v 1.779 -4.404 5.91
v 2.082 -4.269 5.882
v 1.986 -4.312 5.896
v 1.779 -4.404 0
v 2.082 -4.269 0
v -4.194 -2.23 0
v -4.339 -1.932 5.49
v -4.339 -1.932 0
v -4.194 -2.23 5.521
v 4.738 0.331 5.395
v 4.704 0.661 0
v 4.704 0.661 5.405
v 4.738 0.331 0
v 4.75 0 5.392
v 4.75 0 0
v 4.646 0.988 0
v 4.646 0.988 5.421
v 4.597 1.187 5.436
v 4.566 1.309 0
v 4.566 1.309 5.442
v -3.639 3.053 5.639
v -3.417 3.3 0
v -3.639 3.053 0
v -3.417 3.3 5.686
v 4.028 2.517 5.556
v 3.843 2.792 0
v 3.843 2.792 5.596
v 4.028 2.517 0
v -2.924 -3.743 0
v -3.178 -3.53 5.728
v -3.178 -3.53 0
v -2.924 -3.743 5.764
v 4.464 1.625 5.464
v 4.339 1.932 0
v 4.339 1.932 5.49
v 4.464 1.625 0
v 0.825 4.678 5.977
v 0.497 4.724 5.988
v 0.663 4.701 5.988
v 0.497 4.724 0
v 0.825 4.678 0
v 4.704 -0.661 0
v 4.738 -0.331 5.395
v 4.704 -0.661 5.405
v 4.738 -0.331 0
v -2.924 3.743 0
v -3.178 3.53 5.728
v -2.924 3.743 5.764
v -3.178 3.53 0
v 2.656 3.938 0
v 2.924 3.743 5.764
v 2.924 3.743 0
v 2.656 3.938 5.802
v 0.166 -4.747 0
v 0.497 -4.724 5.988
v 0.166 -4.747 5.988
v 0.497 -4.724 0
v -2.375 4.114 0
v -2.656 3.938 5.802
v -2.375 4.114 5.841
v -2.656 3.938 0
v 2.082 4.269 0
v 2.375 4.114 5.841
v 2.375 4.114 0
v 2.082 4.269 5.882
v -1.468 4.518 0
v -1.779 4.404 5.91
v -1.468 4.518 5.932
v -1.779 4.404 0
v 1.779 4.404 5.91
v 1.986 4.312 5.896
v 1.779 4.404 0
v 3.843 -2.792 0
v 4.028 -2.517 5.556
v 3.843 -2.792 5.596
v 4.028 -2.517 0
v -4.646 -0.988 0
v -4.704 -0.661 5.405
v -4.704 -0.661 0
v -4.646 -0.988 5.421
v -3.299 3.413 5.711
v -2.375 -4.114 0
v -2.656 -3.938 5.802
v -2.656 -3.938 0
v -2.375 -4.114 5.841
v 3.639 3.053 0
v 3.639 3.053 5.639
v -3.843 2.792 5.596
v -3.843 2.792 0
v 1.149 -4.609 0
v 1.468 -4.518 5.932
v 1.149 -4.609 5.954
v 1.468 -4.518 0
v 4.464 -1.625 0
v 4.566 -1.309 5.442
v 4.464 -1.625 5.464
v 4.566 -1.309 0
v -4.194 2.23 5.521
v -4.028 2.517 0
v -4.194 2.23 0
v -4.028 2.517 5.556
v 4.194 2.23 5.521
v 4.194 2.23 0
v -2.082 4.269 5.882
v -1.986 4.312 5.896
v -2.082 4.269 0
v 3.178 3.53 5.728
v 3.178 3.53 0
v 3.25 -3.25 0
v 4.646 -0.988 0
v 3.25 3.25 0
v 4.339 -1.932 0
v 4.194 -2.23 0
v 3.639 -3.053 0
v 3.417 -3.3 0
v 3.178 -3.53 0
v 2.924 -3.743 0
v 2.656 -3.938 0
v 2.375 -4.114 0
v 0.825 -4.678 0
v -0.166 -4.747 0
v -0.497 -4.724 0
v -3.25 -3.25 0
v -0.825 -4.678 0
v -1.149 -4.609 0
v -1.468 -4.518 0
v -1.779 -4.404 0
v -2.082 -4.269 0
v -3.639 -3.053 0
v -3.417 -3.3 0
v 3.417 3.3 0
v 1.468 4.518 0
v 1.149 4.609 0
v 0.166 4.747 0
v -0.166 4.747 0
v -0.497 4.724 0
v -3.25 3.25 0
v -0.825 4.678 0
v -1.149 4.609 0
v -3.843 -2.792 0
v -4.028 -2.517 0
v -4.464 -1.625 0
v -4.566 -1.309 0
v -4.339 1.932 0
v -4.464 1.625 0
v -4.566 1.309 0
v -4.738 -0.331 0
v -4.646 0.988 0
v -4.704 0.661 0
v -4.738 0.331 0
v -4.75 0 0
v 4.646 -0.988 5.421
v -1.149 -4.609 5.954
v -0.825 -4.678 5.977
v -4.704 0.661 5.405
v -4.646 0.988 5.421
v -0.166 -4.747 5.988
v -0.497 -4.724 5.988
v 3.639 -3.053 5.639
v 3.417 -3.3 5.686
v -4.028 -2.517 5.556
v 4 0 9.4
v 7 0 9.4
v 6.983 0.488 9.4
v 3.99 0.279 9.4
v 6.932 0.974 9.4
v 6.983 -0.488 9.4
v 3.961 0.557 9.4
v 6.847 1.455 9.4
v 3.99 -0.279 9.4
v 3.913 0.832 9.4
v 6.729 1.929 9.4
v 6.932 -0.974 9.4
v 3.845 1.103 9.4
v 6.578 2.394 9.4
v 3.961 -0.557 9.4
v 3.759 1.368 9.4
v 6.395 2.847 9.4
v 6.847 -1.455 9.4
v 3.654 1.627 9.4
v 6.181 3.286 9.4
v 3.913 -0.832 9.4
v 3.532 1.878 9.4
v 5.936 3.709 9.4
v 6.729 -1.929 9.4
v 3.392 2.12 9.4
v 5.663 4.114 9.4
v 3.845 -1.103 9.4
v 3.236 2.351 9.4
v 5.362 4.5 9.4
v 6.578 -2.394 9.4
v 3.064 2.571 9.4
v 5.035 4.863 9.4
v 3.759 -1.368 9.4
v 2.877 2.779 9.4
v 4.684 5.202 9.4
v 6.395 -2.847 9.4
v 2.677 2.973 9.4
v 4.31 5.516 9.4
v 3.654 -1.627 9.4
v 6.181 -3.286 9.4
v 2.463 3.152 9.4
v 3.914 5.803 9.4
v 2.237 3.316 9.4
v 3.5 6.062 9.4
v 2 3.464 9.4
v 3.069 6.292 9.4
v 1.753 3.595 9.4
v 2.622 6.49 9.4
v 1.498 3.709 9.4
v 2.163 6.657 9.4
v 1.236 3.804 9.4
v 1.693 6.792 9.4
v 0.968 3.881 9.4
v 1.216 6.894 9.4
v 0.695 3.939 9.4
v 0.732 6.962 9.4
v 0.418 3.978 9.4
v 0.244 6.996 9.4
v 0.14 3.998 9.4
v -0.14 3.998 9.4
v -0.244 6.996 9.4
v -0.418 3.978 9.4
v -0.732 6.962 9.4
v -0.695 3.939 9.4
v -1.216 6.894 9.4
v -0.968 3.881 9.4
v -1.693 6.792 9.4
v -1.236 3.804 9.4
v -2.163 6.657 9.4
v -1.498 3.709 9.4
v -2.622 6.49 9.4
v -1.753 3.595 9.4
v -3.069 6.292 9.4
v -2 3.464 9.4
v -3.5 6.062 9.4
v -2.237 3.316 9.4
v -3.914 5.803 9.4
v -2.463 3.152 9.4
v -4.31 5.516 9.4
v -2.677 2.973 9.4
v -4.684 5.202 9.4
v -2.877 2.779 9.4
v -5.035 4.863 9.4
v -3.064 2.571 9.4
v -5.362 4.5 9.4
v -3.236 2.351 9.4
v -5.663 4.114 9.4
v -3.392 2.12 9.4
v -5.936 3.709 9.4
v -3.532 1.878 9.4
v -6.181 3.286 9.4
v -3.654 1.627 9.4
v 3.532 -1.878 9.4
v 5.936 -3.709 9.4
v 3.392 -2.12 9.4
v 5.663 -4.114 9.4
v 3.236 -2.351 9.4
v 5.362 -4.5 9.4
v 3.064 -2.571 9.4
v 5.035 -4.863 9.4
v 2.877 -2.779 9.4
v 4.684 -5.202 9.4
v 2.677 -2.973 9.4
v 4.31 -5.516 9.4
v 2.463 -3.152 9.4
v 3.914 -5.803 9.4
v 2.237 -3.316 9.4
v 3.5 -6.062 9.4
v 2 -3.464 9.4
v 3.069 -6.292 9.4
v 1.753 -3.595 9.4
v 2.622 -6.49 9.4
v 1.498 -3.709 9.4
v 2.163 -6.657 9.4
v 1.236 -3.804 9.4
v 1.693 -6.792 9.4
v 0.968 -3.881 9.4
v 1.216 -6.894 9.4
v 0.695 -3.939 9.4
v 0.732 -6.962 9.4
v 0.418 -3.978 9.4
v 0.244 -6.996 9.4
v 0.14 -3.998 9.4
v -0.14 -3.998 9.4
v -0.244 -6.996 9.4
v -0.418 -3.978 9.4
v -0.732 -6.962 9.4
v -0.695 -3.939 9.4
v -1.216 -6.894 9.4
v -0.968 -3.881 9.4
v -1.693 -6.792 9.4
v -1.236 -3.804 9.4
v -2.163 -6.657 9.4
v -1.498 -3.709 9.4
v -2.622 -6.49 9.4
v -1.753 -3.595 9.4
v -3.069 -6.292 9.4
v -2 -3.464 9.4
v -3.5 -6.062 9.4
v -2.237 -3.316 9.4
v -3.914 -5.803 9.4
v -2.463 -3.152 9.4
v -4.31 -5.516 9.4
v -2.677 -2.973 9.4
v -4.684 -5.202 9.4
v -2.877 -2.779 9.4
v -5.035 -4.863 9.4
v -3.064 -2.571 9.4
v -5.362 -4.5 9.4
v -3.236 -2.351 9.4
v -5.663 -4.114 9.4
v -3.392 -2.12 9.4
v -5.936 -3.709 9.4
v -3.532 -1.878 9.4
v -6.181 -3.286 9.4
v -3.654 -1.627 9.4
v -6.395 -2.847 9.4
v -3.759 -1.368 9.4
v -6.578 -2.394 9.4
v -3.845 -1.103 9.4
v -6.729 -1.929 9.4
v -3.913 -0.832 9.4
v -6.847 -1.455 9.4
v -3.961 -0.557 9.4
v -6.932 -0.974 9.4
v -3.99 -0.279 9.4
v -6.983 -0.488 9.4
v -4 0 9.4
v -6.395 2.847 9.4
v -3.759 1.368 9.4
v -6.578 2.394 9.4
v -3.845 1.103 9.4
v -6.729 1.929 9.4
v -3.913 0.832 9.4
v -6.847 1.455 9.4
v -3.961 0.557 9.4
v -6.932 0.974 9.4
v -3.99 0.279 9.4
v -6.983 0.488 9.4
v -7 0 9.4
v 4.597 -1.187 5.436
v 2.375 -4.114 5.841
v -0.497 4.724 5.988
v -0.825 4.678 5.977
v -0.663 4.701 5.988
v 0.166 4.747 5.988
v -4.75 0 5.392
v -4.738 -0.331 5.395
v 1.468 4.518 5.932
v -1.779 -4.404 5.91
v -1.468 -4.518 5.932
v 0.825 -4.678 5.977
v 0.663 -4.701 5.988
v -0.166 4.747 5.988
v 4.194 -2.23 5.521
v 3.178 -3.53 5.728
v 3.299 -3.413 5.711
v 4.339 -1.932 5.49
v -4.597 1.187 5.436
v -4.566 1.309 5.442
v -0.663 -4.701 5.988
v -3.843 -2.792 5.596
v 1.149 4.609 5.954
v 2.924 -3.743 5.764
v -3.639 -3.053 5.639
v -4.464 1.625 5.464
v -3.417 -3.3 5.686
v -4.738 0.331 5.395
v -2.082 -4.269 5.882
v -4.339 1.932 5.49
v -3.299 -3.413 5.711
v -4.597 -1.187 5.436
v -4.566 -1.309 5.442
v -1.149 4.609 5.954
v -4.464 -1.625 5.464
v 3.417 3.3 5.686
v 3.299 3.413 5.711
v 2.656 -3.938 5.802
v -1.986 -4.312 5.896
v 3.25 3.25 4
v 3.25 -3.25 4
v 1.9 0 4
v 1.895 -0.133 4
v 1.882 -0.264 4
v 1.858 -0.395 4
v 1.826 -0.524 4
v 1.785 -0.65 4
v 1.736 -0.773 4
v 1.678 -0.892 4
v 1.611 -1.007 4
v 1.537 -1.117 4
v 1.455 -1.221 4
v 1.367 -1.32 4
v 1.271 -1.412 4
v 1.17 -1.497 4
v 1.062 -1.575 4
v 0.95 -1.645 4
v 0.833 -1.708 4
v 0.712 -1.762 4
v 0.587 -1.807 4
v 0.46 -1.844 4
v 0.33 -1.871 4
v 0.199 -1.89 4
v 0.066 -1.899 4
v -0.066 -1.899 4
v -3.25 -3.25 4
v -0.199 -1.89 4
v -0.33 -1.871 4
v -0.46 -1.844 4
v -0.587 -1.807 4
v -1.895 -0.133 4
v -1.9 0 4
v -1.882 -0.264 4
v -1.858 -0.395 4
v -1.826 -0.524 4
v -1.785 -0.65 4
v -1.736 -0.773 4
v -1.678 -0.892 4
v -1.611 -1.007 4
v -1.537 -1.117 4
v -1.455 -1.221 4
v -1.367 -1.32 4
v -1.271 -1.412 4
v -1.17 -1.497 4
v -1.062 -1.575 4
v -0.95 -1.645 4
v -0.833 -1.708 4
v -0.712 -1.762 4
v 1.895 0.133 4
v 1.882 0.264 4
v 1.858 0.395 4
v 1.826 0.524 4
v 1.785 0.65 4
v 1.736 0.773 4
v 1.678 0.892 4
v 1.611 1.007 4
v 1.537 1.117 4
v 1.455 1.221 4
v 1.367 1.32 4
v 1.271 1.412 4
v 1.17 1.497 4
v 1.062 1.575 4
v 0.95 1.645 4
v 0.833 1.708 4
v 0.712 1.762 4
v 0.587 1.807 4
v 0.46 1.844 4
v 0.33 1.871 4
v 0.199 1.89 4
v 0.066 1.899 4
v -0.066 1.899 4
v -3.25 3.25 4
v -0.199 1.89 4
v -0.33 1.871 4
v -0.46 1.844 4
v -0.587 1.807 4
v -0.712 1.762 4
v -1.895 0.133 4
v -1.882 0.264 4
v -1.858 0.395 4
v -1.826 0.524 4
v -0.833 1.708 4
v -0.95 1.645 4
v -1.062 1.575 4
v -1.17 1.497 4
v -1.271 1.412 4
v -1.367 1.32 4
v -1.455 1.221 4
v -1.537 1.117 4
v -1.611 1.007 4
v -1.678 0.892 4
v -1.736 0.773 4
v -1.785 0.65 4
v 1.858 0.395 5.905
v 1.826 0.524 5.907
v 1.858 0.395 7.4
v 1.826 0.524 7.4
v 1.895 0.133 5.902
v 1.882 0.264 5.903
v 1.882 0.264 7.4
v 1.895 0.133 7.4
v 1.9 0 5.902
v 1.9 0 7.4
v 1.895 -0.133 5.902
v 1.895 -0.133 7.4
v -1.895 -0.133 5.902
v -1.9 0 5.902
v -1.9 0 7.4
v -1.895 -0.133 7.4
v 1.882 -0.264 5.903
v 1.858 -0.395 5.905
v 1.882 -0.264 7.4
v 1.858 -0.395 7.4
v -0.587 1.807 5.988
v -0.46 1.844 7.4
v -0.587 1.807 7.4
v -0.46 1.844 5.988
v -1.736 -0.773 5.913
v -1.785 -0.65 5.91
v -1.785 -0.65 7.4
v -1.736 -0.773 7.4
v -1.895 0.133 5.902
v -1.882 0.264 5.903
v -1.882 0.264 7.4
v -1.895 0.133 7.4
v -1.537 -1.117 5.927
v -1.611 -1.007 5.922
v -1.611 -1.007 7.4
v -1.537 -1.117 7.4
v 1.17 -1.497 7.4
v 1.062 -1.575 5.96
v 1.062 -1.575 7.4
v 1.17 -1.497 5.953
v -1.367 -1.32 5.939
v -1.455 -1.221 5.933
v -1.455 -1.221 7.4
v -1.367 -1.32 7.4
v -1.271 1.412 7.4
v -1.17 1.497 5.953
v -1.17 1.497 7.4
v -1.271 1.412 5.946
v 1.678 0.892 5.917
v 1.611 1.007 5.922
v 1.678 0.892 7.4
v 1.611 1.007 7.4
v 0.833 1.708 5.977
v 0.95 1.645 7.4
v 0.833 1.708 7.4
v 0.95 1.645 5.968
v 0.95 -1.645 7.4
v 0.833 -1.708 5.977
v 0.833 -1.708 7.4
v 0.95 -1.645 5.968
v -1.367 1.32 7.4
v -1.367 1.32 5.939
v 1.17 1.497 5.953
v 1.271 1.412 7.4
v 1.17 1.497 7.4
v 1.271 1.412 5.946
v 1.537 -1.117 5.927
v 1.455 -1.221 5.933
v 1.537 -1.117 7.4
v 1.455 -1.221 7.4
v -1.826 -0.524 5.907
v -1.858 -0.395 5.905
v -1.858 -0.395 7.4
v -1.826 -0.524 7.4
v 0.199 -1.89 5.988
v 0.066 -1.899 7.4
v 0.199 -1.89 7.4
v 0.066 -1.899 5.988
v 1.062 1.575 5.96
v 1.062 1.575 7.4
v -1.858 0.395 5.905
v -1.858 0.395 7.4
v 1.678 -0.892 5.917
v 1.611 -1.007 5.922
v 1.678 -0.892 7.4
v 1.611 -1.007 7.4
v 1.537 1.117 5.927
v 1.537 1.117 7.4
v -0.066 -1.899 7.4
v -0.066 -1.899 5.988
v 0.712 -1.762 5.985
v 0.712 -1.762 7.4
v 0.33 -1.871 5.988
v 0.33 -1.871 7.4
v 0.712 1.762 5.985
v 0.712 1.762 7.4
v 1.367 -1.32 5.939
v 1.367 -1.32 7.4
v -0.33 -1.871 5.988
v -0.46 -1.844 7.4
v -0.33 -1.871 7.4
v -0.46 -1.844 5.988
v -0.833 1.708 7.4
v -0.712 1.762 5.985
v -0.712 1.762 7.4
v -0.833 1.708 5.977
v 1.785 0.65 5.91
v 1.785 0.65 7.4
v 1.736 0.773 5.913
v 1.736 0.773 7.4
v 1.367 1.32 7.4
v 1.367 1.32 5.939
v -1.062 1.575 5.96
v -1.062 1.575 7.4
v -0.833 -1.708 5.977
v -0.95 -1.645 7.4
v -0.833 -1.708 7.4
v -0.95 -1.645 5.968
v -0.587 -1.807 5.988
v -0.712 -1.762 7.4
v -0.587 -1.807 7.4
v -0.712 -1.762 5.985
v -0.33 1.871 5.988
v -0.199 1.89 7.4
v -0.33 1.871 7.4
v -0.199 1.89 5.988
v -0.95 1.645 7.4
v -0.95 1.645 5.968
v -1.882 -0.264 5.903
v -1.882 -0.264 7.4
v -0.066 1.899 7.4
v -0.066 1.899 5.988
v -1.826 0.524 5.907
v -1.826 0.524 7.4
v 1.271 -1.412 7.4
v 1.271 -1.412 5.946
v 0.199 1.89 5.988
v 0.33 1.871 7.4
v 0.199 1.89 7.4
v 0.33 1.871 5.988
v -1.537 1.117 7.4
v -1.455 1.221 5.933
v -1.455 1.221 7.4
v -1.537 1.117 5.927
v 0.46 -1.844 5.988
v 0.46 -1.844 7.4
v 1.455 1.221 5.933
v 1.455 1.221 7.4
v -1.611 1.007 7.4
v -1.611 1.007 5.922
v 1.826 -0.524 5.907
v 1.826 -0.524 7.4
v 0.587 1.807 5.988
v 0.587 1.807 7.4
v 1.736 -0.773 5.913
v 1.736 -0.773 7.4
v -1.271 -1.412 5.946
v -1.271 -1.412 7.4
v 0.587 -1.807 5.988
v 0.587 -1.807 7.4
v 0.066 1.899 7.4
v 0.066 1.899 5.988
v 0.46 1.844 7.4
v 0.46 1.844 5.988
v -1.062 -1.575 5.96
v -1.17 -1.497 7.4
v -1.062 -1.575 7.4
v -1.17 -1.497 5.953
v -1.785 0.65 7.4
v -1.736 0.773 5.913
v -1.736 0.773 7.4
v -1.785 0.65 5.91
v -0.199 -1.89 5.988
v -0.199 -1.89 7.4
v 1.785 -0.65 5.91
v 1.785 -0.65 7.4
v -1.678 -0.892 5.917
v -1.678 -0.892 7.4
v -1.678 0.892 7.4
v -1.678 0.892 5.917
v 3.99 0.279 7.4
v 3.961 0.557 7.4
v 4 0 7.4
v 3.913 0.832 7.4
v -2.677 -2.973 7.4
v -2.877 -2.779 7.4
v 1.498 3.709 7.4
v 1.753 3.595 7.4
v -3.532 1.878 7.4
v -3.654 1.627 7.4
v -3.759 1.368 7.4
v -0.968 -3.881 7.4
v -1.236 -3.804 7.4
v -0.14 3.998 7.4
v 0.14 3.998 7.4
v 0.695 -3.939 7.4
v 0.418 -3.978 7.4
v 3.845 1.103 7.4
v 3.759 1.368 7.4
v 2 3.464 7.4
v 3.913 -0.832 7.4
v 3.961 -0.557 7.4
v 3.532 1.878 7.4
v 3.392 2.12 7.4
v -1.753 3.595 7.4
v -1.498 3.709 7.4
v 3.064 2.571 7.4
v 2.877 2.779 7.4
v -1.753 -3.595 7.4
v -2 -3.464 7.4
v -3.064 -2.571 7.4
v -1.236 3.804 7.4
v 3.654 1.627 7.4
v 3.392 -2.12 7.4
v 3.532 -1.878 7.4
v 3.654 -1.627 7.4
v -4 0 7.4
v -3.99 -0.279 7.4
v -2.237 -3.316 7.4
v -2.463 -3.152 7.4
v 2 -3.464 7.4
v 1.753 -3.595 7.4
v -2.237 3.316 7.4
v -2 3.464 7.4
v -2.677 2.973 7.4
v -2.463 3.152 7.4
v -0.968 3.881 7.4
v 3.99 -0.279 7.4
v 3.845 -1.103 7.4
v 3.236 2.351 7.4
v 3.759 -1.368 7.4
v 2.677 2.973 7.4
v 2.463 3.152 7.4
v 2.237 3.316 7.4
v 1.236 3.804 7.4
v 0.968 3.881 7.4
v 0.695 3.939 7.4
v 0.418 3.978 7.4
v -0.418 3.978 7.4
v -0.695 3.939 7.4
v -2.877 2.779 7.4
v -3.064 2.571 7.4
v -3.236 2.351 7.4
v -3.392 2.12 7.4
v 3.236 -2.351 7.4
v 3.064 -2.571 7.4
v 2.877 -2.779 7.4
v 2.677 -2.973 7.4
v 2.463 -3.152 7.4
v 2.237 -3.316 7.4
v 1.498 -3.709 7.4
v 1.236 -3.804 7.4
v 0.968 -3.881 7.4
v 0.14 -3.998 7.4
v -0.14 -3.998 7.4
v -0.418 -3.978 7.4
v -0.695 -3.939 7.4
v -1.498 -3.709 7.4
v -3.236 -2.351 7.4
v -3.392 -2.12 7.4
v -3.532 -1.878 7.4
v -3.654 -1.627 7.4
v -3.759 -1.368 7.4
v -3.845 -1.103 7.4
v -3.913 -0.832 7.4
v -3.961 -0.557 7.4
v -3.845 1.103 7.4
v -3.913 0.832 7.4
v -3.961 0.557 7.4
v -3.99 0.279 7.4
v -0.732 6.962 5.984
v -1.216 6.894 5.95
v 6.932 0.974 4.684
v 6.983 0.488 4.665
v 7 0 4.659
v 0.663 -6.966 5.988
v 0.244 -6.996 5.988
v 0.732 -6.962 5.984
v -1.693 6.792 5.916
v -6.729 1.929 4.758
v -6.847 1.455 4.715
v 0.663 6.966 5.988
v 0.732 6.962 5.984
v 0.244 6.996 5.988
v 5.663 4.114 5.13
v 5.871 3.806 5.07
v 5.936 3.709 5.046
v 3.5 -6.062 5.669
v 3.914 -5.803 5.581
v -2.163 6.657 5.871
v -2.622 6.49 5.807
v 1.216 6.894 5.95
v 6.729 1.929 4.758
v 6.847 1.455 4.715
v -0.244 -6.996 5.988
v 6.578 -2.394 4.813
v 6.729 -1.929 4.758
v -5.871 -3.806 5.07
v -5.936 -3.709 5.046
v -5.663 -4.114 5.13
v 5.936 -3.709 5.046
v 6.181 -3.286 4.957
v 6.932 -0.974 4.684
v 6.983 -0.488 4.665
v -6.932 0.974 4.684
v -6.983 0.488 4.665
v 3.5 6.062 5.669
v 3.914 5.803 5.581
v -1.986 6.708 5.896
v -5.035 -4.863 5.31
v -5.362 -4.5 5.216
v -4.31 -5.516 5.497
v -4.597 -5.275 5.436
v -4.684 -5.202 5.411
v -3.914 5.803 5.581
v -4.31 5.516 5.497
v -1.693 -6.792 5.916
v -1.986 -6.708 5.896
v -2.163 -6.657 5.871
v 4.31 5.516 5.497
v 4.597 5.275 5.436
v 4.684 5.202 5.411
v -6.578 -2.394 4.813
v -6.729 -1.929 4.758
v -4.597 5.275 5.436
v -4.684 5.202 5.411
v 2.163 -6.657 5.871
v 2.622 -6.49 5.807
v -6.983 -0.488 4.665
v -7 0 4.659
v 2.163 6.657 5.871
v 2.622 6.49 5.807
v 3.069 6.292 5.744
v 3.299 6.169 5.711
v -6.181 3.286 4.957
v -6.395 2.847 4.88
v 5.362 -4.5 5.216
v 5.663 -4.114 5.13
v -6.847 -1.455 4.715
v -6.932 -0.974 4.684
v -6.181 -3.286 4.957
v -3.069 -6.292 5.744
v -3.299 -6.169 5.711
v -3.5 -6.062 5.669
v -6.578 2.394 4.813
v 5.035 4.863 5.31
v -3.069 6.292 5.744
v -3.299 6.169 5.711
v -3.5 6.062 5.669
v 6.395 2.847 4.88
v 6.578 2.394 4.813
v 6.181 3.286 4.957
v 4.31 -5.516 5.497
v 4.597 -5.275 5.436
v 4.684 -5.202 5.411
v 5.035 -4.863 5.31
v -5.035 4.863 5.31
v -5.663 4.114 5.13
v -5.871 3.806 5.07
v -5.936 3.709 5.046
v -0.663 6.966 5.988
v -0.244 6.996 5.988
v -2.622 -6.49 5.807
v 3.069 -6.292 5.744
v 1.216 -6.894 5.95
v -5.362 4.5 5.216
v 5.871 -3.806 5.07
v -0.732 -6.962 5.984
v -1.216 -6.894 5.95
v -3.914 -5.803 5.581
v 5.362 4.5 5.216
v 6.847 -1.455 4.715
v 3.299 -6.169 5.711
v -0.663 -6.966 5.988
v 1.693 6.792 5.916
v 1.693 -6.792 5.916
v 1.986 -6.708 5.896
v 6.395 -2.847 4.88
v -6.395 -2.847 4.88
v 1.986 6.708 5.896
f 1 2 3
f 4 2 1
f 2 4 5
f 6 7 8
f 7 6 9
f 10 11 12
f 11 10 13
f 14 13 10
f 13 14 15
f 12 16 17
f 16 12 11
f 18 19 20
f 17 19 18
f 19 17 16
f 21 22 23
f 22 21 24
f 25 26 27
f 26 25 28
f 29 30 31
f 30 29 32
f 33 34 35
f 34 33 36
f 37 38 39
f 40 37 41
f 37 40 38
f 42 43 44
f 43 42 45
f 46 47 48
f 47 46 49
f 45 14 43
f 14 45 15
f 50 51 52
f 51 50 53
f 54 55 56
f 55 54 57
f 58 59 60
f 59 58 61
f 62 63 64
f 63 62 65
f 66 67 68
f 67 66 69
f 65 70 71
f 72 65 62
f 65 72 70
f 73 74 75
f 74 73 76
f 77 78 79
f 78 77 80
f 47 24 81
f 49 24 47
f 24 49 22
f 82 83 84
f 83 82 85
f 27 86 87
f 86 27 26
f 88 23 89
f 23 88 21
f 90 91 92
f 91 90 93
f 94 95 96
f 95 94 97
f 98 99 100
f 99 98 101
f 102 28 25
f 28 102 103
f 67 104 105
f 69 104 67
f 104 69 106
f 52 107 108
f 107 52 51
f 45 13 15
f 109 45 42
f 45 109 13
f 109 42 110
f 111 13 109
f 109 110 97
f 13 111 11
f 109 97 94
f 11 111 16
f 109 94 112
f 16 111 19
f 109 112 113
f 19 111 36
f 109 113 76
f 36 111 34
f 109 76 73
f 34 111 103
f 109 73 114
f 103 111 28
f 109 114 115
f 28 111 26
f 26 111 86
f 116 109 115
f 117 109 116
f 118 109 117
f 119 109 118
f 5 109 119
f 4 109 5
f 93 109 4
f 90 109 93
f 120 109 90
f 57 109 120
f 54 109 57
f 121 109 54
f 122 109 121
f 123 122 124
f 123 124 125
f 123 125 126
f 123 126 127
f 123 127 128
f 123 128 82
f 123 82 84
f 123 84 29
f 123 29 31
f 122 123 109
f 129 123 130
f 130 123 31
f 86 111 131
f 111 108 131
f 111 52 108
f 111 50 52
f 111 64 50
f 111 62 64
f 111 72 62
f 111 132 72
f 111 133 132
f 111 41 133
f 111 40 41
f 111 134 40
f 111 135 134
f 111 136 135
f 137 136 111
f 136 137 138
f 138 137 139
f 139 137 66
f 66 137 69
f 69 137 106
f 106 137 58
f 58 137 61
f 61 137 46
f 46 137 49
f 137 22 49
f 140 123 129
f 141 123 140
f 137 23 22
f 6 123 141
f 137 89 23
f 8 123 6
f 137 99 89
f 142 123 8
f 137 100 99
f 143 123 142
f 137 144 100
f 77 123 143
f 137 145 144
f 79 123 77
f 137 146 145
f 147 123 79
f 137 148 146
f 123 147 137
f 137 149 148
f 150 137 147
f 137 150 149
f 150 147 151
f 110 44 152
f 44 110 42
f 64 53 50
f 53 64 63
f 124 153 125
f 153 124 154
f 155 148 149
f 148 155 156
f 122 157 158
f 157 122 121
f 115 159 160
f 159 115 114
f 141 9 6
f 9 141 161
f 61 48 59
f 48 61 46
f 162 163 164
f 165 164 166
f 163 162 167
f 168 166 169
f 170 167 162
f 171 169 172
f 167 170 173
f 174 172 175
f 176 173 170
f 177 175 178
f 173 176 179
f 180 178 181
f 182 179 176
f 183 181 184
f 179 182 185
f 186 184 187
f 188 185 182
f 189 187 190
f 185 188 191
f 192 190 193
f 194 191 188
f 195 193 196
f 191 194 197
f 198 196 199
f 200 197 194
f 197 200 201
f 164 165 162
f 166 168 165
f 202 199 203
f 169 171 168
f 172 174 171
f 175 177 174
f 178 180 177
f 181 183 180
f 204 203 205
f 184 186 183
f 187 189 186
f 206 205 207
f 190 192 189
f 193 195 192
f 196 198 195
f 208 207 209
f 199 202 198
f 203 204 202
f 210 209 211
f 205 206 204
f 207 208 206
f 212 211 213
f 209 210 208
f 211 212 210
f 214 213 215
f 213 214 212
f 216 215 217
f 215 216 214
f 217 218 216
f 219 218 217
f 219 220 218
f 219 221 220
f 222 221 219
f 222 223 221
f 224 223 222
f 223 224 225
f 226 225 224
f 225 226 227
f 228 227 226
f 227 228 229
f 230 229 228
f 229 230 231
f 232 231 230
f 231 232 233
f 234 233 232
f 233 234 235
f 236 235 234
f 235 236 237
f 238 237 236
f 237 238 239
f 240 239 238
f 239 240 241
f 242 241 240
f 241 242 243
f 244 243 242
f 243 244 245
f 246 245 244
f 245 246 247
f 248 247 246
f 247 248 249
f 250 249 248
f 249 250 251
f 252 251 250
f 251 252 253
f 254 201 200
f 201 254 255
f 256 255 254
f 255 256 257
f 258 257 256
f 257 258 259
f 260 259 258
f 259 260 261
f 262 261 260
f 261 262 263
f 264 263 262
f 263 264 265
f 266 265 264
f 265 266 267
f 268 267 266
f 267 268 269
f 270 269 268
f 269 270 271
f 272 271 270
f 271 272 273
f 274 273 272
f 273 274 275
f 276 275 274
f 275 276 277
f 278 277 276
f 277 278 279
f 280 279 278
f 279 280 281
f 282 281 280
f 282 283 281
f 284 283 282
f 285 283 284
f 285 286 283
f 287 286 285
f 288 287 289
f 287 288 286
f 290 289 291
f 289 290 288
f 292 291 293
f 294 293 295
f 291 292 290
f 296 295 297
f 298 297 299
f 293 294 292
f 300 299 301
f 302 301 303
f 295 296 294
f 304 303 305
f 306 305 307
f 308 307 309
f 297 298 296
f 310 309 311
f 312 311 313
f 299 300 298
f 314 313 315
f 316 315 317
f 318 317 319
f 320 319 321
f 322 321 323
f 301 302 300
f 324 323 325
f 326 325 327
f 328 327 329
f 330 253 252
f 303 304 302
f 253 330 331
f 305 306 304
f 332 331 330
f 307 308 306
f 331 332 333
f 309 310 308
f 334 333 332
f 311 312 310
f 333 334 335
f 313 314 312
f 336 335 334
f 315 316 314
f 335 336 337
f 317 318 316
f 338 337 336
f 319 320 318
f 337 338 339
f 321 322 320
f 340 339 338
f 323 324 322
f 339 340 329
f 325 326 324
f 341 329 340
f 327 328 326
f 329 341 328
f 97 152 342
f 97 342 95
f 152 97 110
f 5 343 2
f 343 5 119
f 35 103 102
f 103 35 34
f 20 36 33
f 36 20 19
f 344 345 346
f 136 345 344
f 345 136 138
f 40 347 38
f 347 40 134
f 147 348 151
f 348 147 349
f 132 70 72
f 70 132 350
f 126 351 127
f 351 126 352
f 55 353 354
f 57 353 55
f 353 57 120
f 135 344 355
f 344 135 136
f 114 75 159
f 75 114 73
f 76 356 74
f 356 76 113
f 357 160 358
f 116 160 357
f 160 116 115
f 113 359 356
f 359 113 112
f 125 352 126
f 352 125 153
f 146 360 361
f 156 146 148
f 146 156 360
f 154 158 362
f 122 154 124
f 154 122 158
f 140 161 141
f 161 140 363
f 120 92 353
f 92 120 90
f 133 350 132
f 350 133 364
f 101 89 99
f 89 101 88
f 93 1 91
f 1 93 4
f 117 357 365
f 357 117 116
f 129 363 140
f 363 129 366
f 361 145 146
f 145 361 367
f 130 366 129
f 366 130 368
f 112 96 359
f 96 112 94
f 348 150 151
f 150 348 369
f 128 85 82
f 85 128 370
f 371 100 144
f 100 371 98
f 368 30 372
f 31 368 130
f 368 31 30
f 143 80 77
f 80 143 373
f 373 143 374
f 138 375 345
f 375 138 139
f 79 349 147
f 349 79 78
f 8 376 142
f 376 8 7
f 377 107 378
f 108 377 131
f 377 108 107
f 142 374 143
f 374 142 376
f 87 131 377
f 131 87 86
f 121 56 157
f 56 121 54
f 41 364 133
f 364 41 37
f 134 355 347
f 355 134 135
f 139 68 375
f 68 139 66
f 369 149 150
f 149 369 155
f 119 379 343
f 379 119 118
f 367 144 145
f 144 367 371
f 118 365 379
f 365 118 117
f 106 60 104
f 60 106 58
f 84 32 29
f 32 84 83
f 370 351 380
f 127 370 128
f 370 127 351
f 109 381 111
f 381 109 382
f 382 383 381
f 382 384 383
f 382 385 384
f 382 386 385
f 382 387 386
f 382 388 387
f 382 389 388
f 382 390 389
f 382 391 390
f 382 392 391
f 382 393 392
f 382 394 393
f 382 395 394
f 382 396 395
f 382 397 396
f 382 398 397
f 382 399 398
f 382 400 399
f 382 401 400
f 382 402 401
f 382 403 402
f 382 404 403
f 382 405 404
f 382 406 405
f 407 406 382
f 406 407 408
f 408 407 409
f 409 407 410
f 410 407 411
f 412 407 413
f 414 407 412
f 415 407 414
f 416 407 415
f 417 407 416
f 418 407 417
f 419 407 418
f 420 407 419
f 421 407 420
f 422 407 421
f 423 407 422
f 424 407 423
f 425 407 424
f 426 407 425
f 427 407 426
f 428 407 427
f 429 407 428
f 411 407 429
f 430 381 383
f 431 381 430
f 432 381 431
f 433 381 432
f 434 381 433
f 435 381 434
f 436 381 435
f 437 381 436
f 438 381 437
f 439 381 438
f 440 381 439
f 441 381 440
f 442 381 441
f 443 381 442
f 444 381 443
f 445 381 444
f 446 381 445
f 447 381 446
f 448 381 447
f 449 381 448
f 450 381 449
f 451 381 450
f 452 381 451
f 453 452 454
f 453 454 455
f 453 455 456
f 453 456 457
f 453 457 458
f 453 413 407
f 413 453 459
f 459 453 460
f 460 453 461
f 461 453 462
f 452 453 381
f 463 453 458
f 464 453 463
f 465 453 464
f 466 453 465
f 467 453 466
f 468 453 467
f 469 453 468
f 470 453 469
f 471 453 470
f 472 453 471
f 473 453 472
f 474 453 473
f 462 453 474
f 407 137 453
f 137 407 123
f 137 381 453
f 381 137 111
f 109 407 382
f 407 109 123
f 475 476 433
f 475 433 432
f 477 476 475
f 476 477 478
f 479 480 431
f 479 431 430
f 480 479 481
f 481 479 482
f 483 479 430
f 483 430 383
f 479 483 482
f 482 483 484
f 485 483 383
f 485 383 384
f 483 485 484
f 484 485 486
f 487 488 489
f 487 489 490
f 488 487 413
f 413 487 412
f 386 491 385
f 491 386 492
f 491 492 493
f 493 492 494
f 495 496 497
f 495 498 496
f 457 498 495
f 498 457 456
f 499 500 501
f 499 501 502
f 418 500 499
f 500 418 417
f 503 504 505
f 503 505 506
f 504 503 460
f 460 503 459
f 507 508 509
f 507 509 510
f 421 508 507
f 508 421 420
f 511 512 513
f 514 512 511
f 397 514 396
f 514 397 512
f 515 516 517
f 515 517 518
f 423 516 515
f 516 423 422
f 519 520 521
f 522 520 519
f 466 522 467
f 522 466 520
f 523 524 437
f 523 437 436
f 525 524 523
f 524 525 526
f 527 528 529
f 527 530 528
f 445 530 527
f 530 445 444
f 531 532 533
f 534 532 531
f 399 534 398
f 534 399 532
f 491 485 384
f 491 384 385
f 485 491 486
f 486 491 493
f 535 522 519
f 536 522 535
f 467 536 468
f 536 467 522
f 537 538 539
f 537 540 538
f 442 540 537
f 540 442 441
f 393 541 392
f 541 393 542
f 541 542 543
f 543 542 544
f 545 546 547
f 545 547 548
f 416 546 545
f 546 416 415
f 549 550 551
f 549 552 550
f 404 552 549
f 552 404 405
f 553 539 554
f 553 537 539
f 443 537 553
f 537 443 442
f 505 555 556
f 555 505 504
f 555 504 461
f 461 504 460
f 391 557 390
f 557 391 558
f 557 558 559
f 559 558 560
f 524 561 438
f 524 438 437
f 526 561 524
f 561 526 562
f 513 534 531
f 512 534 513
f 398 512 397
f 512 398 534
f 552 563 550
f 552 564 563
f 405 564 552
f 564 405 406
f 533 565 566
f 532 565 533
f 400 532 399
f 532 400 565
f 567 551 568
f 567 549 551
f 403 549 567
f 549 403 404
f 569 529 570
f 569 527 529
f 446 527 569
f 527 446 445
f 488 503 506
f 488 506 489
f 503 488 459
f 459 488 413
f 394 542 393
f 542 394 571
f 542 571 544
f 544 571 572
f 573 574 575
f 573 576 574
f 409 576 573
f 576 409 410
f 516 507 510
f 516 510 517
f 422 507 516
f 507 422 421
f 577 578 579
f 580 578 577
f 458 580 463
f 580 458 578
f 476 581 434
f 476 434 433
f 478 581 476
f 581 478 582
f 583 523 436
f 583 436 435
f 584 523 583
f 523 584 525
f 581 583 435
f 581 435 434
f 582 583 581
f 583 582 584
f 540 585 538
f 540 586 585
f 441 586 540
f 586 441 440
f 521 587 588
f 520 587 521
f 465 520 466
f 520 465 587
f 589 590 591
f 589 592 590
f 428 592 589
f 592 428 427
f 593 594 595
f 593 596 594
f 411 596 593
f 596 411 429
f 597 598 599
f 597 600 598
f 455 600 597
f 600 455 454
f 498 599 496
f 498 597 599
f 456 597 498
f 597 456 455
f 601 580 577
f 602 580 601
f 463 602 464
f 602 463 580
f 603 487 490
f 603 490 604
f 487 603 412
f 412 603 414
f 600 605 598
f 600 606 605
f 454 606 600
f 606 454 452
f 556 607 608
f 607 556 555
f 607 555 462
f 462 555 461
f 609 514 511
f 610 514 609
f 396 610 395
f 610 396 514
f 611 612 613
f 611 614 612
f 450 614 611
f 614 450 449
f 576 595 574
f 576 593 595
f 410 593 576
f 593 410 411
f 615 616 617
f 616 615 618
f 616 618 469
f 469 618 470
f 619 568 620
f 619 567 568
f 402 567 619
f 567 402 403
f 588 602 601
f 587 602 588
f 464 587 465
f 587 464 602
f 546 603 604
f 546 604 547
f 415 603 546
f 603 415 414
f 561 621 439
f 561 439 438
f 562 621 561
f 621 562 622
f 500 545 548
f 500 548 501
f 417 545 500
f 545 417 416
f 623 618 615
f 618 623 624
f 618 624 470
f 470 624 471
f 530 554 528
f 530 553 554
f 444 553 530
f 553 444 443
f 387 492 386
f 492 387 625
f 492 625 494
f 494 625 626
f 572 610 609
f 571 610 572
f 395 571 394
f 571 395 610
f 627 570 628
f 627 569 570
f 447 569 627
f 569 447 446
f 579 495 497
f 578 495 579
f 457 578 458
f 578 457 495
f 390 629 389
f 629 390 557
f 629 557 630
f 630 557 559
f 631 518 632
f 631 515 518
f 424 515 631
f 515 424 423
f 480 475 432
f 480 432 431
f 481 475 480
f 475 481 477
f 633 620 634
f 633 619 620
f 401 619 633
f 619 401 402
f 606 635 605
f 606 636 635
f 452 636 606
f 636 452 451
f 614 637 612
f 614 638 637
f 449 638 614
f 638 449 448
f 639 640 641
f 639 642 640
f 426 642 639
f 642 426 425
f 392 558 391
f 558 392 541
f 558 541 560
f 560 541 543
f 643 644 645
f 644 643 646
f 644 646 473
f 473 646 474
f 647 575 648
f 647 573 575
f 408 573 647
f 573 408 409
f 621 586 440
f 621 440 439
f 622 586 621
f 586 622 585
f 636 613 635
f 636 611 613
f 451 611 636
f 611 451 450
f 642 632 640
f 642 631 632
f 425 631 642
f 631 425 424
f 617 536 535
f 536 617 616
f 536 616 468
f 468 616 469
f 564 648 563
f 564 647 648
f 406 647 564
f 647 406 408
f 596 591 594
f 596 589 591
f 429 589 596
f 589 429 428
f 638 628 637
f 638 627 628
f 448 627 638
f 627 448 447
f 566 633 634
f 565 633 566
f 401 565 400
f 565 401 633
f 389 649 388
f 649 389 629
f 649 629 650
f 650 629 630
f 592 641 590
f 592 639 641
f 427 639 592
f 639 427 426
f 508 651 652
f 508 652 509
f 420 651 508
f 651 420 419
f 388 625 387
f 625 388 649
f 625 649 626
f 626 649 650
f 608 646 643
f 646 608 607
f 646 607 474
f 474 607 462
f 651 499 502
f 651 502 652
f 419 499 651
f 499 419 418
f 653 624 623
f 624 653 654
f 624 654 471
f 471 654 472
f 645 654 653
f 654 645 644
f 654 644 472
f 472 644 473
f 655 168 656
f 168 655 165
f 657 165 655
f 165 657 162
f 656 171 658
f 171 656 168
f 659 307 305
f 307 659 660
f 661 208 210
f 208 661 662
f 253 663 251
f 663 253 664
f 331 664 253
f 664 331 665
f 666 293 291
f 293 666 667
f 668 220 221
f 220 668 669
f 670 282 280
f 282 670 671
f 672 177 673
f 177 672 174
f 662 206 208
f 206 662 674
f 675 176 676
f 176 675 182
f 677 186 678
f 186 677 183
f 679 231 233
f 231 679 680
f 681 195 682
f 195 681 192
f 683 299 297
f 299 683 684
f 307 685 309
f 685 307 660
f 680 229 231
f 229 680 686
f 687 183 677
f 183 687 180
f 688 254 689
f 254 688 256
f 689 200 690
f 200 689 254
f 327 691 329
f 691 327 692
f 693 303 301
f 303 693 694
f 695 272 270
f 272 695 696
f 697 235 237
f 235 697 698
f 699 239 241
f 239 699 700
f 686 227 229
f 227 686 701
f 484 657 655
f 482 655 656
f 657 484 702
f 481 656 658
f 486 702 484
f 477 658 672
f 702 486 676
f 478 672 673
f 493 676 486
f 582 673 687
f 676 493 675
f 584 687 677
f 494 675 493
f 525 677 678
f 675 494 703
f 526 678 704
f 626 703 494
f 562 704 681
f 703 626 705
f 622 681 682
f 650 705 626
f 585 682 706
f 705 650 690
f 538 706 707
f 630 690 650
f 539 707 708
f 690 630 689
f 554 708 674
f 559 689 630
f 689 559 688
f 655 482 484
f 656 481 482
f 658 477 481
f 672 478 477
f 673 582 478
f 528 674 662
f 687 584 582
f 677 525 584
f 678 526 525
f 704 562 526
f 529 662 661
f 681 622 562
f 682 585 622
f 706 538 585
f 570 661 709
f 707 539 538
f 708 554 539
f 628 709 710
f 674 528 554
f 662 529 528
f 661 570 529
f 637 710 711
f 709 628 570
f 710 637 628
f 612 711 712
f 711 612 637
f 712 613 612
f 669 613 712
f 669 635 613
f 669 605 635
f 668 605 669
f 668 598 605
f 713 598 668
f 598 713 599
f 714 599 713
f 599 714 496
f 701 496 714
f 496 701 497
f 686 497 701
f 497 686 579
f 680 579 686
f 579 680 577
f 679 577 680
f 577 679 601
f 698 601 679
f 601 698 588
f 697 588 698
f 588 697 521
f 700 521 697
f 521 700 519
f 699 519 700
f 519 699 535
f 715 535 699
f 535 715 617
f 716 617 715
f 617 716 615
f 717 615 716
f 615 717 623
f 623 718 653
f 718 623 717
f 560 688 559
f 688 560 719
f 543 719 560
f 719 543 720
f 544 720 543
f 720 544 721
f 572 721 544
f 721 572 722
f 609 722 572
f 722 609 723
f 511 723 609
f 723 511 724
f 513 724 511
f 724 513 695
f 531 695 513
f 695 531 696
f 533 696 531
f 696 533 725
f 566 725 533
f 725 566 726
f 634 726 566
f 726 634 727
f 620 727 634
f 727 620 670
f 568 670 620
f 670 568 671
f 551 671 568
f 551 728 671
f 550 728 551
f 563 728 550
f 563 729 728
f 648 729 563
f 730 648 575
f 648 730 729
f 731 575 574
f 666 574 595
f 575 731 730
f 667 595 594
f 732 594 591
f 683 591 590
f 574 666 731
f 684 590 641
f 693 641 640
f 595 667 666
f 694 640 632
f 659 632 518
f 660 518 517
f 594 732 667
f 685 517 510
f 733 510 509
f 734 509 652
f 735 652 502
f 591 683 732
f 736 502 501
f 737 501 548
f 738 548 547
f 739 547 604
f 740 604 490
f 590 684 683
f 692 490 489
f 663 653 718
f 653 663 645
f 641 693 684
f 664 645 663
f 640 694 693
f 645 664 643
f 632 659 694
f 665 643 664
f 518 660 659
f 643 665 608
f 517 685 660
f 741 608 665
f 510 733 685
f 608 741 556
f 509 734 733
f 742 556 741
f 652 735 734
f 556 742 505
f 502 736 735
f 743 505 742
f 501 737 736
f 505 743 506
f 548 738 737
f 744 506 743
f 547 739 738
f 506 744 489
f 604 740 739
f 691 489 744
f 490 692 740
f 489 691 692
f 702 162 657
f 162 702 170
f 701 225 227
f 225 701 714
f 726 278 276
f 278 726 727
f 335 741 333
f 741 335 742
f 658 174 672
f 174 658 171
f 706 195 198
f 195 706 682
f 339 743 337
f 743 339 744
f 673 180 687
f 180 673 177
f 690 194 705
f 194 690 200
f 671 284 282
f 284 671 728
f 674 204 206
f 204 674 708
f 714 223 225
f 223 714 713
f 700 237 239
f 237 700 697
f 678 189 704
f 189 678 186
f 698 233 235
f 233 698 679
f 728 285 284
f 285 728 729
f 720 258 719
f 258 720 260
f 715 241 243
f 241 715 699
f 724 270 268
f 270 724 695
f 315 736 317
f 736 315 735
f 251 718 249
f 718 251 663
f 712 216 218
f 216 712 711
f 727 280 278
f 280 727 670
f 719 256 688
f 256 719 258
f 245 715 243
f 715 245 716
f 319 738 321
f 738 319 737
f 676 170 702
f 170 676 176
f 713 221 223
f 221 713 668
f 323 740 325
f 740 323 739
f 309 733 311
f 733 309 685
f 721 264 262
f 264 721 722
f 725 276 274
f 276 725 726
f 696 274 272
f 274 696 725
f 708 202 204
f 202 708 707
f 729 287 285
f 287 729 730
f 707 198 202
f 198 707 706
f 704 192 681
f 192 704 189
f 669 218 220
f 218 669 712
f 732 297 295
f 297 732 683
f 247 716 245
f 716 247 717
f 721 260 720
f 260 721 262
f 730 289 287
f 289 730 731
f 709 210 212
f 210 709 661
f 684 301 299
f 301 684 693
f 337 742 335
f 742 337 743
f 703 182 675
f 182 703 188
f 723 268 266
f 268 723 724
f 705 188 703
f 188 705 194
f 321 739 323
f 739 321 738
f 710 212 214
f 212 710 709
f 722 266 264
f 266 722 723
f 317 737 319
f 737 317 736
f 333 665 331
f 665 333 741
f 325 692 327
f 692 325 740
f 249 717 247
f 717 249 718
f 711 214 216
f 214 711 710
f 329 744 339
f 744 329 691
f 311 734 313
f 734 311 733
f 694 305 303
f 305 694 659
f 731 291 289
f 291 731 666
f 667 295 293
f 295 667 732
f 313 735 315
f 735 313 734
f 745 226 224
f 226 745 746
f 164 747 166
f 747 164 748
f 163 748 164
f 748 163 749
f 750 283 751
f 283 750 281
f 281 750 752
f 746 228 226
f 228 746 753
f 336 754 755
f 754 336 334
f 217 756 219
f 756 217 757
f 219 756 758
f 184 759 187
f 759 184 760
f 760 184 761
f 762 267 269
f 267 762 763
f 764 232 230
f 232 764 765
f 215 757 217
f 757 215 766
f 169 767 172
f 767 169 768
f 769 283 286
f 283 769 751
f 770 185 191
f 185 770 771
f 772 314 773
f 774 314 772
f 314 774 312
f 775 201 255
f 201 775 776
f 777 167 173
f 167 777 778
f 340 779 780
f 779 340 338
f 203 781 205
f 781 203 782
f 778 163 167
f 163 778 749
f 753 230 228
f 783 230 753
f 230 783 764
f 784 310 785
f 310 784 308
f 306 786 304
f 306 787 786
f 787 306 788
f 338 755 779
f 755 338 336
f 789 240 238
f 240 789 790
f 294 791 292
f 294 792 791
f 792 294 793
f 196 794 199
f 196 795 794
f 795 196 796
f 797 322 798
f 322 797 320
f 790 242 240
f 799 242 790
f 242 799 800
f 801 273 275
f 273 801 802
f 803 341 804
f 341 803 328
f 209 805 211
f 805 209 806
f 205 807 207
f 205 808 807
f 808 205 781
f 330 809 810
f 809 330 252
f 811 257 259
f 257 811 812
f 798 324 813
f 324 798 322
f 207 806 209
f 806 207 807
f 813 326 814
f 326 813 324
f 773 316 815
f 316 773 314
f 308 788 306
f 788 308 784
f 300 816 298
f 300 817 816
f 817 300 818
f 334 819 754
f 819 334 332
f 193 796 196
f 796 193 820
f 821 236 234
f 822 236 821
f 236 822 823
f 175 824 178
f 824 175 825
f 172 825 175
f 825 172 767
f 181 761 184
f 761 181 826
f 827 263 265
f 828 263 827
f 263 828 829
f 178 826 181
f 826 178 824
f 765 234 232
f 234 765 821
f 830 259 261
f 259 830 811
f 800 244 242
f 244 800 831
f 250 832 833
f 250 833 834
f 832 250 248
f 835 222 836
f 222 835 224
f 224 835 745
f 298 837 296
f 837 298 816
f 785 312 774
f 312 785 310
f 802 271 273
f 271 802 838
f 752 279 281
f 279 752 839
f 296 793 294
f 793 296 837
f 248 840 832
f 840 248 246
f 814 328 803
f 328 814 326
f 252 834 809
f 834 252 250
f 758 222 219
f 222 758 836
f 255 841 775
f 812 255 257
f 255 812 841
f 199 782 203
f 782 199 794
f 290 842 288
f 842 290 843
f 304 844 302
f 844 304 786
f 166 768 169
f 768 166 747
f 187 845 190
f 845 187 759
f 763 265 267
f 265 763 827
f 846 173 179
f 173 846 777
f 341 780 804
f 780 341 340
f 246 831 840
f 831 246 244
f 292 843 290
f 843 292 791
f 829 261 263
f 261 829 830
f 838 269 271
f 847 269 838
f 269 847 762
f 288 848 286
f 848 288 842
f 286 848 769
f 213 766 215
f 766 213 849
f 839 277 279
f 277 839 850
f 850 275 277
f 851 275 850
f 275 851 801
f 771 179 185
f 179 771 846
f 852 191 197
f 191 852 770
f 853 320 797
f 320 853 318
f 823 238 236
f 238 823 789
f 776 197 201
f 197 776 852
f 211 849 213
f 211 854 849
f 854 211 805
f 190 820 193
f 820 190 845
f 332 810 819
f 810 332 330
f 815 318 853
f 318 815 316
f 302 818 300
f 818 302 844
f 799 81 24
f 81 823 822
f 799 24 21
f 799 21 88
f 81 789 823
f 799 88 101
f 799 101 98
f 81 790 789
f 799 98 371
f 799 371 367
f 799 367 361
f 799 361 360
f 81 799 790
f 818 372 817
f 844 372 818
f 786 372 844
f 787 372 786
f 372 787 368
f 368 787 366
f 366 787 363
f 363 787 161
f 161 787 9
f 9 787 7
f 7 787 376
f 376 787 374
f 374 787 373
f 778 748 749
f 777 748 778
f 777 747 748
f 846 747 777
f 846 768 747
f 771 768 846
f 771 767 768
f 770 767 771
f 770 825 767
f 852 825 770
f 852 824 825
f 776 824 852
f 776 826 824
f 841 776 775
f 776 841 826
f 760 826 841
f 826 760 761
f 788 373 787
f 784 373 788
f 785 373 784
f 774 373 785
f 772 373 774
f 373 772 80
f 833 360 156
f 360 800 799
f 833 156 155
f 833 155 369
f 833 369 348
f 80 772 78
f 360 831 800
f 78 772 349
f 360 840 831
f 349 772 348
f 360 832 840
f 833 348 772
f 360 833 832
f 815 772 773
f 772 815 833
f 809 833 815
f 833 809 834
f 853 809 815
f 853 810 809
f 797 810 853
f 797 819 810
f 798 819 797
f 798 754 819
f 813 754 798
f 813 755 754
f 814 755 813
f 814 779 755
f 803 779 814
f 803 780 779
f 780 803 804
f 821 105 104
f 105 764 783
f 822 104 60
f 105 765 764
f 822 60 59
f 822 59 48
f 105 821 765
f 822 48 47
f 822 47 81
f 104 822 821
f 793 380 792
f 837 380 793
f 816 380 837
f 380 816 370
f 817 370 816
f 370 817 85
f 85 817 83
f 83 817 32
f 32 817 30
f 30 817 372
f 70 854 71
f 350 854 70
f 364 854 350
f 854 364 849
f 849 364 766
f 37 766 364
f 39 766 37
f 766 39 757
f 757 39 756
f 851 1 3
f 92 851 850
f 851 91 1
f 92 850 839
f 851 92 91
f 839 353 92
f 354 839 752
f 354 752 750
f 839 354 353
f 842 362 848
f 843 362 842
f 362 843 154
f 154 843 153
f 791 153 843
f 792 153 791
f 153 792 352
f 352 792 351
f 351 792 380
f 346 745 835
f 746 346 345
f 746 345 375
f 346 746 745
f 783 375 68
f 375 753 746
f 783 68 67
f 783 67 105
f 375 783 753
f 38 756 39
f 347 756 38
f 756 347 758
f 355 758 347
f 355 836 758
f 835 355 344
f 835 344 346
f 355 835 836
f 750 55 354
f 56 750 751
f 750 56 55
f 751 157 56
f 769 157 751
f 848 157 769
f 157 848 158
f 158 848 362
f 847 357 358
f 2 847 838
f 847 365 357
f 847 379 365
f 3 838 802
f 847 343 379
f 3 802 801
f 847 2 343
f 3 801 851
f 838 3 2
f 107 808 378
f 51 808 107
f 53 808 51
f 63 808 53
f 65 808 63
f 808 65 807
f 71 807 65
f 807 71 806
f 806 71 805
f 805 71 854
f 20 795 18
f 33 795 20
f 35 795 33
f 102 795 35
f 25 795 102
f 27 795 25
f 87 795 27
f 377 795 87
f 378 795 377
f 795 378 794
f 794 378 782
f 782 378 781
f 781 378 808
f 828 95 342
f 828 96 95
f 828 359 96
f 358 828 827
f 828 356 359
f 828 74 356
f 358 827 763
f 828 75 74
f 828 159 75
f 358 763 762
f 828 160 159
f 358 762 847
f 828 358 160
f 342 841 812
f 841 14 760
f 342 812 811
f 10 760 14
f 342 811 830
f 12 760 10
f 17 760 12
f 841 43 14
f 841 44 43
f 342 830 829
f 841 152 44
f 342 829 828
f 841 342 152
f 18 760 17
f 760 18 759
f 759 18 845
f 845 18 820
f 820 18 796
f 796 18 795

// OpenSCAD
$fn=90;

LOWER_H = 6.0;
UPPER_H = 3.4; // 2.4; // 4.4;
TOTAL_H = UPPER_H + LOWER_H;

SW_X = 6.5;
SW_Z = 4.0;

LOWER_D = 9.5; // 9.35;
UPPER_D = 14.0;
OUTER_D = 38.0;

module centerPost() {
    cylinder(h=20, d=3.8);
}

module inset() {
    INSET = 2;
    D = 8;
    translate([0, 0, TOTAL_H-INSET]) cylinder(h=10, d=D);
}

difference() {
    cylinder(d=LOWER_D, h=TOTAL_H);
    translate([-SW_X/2, -SW_X/2, 0]) cube(size=[SW_X, SW_X, SW_Z]);
    centerPost();
    inset();
}

difference() {
    union() {
        cylinder(d=UPPER_D, h=TOTAL_H);
    }
    translate([0, 10, -OUTER_D/2 + LOWER_H]) rotate([90, 0, 0]) cylinder(h=20, d=OUTER_D);   
    centerPost();
    inset();
}
